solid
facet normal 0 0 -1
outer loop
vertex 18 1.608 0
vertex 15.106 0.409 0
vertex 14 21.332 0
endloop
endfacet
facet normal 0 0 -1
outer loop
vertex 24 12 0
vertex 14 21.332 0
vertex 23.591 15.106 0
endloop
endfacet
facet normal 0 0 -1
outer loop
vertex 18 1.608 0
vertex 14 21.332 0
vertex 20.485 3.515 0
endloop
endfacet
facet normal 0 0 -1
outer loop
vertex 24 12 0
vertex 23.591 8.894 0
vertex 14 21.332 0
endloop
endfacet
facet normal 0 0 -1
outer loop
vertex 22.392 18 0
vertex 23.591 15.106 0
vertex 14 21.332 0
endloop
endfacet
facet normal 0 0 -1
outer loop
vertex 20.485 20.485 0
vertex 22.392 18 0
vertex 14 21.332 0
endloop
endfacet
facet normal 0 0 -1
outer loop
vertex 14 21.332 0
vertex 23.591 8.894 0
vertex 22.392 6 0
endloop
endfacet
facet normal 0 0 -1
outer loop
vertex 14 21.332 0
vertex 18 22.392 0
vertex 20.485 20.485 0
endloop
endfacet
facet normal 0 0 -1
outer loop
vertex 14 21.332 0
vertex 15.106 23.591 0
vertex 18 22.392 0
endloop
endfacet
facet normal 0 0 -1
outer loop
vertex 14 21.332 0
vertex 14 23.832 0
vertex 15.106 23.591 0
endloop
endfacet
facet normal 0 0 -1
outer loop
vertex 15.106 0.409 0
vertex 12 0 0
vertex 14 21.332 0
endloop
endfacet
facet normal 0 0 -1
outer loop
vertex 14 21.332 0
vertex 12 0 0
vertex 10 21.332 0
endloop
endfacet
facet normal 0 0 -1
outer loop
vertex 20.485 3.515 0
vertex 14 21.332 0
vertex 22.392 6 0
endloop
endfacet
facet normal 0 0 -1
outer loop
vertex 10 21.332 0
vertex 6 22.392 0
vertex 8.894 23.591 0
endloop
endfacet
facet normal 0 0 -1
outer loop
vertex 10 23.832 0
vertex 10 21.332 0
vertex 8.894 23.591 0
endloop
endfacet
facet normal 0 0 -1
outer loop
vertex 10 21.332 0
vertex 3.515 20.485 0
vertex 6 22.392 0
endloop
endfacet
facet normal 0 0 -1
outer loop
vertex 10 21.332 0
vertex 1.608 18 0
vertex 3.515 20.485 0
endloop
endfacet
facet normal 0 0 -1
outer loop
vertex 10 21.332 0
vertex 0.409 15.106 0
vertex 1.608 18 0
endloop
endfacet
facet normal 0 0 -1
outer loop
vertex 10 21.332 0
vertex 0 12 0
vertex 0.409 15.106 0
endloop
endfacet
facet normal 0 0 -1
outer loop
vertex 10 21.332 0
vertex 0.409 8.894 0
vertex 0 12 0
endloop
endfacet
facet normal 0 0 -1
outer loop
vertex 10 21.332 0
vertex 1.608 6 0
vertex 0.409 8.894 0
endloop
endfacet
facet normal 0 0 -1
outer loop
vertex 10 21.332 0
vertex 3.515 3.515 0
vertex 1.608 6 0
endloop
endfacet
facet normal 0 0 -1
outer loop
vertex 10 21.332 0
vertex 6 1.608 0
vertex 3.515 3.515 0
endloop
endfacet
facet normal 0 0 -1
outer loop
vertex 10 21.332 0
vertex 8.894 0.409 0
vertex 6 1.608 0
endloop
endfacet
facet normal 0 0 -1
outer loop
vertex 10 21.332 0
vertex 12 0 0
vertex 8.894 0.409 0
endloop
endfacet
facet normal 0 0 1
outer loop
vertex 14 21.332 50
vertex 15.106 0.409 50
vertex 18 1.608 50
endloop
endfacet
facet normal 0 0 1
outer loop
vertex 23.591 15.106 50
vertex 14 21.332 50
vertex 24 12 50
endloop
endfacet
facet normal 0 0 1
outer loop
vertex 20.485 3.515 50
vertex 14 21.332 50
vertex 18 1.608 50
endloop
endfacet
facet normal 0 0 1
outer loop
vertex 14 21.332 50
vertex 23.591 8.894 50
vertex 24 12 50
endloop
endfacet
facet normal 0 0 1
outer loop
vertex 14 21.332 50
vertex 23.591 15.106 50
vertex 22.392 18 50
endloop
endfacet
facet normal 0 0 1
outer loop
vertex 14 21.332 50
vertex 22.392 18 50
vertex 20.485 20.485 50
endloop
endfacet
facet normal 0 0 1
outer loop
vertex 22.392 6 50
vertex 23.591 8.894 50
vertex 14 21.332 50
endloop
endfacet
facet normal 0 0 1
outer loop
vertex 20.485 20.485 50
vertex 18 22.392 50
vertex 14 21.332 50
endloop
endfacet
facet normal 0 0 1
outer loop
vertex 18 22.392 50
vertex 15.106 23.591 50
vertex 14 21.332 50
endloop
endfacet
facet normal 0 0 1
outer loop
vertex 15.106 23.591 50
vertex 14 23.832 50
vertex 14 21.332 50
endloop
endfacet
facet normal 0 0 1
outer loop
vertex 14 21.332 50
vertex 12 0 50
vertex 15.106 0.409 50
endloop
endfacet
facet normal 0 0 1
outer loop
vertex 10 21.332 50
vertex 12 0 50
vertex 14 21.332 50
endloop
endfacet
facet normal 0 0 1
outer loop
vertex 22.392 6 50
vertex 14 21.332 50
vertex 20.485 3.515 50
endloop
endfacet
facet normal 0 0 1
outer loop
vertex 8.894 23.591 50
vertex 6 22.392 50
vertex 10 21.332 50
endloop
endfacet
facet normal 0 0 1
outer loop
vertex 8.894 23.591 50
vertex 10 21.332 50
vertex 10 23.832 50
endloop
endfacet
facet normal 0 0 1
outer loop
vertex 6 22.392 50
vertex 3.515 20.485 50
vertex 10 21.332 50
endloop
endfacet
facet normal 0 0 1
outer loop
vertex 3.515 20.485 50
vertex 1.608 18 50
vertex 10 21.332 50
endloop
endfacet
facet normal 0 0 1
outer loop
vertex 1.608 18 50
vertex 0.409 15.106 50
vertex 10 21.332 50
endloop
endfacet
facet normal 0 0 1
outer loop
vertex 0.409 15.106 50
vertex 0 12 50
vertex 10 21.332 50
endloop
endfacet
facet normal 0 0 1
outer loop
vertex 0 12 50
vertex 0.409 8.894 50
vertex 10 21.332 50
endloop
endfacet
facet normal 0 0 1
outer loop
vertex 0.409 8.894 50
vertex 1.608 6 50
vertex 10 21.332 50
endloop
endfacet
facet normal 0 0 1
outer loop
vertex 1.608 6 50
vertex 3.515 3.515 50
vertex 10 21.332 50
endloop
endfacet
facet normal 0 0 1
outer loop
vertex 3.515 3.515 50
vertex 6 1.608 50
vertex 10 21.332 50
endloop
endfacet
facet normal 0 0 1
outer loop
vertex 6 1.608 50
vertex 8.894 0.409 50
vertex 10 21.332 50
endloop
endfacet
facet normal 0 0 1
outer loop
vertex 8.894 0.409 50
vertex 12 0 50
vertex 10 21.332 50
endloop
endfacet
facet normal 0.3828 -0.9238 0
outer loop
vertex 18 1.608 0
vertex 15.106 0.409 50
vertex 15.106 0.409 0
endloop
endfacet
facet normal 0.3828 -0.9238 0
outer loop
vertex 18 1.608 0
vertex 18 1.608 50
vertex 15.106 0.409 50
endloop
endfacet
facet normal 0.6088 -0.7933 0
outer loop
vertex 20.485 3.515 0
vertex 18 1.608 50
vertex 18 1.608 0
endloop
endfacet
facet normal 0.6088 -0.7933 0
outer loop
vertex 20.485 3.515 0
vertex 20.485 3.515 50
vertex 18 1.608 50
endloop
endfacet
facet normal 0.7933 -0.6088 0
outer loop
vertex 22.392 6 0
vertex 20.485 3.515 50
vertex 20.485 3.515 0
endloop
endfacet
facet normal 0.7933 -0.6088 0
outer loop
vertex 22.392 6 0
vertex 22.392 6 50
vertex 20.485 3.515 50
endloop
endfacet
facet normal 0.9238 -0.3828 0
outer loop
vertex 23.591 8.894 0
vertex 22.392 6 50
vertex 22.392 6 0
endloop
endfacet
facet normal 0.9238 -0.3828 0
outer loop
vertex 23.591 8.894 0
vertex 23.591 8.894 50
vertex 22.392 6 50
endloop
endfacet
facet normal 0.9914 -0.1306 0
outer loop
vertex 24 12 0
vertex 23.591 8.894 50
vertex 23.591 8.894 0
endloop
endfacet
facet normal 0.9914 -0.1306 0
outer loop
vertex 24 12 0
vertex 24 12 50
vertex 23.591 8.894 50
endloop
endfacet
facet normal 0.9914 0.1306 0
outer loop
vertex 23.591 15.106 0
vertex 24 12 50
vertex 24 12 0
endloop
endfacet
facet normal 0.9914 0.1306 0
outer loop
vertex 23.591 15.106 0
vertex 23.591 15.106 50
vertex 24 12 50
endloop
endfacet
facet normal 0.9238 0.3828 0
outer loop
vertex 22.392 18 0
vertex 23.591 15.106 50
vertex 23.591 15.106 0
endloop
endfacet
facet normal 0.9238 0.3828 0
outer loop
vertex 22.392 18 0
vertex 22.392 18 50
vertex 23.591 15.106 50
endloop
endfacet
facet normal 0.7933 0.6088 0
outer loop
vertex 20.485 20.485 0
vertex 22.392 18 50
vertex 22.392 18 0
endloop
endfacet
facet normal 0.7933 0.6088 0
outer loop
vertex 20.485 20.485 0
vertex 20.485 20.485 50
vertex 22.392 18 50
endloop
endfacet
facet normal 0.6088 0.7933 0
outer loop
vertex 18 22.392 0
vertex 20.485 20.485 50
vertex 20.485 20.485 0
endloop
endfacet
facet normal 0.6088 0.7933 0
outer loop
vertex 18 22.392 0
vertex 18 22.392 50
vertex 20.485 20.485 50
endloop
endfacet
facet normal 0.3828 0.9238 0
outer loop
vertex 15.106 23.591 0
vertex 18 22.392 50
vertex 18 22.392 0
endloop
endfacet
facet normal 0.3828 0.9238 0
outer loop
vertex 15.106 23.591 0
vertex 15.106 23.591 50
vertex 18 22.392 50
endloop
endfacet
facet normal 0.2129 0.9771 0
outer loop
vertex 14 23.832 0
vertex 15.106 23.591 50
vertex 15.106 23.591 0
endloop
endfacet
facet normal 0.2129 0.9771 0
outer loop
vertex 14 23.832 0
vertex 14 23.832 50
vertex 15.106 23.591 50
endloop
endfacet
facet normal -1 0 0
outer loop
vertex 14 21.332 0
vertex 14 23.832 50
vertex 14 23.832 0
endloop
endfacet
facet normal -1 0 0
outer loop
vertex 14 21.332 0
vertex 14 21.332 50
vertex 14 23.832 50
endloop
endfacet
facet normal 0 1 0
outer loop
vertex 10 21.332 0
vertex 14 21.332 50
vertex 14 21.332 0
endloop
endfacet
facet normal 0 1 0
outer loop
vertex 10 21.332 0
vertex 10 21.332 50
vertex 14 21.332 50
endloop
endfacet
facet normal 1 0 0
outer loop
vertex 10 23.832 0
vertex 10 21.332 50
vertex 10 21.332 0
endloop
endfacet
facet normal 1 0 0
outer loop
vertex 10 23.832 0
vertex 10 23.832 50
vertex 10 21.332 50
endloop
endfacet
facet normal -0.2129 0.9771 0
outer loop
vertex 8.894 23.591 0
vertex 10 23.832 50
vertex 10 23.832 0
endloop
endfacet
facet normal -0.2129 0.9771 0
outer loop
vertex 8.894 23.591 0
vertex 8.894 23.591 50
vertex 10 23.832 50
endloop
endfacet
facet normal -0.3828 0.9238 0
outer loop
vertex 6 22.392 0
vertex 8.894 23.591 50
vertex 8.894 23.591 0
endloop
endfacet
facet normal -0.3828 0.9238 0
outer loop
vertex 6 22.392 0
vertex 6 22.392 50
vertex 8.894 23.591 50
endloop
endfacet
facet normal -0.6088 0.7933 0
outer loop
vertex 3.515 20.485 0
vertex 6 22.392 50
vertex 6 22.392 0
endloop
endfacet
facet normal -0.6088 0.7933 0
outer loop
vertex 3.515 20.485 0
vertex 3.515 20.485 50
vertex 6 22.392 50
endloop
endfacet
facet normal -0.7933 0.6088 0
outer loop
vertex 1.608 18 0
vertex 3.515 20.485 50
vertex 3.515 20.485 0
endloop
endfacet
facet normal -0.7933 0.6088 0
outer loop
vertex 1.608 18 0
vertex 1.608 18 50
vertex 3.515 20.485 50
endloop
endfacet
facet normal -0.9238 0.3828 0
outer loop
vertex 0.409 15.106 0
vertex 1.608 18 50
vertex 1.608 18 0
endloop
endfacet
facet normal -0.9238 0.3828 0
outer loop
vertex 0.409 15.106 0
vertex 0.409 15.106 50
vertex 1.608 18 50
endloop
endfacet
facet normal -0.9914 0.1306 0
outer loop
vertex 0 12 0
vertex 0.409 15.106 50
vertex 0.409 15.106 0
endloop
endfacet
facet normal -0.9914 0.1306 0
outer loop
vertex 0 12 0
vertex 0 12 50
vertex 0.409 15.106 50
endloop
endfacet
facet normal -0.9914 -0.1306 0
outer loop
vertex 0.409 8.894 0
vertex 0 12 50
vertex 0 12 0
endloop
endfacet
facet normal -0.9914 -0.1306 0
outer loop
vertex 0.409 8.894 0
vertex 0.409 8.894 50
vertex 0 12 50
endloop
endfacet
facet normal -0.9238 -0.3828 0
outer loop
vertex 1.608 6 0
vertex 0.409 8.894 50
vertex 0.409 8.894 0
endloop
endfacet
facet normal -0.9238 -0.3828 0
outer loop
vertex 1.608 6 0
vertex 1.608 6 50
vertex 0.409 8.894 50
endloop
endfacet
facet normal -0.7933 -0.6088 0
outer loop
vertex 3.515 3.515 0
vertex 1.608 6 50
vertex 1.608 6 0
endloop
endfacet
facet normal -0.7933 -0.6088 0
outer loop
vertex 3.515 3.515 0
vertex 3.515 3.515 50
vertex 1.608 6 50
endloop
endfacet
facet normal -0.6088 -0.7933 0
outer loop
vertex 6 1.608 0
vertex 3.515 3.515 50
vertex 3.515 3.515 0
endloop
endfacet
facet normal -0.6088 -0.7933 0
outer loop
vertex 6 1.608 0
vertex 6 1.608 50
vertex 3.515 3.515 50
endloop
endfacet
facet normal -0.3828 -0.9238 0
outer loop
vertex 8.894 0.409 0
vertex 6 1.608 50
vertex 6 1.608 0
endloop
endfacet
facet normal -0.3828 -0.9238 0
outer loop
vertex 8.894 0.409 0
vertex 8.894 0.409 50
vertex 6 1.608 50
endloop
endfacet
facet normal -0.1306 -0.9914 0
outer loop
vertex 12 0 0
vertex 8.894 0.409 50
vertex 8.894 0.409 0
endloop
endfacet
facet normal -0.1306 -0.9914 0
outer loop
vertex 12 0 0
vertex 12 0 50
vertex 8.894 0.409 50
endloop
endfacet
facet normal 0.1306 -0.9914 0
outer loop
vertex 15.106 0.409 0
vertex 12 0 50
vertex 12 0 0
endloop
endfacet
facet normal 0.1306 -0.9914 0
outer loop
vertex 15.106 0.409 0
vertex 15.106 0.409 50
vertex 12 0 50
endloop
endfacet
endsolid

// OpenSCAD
$fn = 32;

// ----------------------------------------------------------------------
// Keyway shaft: d24 shaft, key 4 x 2.5 mm
// ----------------------------------------------------------------------

// --- parameters (mm) ---
shaft_r = 12;             // shaft radius
key_w = 4;                // keyway width
key_d = 2.5;              // keyway depth below the surface line
plate_t = 50;             // shaft length, Z (extrusion height)

shaft_d = 2 * shaft_r;  // shaft diameter
circle_step = 15;  // polygon sampling step, degrees

profile = [[8.894, 23.591], [6, 22.392], [3.515, 20.485], [1.608, 18], [0.409, 15.106], [0, 12], [0.409, 8.894], [1.608, 6], [3.515, 3.515], [6, 1.608], [8.894, 0.409], [12, 0], [15.106, 0.409], [18, 1.608], [20.485, 3.515], [22.392, 6], [23.591, 8.894], [24, 12], [23.591, 15.106], [22.392, 18], [20.485, 20.485], [18, 22.392], [15.106, 23.591], [14, 23.832], [14, 21.332], [10, 21.332], [10, 23.832]];  // primary outline, 27 points, counter clockwise

// --- the one profile operation ---
linear_extrude(height = plate_t) polygon(points = profile);
